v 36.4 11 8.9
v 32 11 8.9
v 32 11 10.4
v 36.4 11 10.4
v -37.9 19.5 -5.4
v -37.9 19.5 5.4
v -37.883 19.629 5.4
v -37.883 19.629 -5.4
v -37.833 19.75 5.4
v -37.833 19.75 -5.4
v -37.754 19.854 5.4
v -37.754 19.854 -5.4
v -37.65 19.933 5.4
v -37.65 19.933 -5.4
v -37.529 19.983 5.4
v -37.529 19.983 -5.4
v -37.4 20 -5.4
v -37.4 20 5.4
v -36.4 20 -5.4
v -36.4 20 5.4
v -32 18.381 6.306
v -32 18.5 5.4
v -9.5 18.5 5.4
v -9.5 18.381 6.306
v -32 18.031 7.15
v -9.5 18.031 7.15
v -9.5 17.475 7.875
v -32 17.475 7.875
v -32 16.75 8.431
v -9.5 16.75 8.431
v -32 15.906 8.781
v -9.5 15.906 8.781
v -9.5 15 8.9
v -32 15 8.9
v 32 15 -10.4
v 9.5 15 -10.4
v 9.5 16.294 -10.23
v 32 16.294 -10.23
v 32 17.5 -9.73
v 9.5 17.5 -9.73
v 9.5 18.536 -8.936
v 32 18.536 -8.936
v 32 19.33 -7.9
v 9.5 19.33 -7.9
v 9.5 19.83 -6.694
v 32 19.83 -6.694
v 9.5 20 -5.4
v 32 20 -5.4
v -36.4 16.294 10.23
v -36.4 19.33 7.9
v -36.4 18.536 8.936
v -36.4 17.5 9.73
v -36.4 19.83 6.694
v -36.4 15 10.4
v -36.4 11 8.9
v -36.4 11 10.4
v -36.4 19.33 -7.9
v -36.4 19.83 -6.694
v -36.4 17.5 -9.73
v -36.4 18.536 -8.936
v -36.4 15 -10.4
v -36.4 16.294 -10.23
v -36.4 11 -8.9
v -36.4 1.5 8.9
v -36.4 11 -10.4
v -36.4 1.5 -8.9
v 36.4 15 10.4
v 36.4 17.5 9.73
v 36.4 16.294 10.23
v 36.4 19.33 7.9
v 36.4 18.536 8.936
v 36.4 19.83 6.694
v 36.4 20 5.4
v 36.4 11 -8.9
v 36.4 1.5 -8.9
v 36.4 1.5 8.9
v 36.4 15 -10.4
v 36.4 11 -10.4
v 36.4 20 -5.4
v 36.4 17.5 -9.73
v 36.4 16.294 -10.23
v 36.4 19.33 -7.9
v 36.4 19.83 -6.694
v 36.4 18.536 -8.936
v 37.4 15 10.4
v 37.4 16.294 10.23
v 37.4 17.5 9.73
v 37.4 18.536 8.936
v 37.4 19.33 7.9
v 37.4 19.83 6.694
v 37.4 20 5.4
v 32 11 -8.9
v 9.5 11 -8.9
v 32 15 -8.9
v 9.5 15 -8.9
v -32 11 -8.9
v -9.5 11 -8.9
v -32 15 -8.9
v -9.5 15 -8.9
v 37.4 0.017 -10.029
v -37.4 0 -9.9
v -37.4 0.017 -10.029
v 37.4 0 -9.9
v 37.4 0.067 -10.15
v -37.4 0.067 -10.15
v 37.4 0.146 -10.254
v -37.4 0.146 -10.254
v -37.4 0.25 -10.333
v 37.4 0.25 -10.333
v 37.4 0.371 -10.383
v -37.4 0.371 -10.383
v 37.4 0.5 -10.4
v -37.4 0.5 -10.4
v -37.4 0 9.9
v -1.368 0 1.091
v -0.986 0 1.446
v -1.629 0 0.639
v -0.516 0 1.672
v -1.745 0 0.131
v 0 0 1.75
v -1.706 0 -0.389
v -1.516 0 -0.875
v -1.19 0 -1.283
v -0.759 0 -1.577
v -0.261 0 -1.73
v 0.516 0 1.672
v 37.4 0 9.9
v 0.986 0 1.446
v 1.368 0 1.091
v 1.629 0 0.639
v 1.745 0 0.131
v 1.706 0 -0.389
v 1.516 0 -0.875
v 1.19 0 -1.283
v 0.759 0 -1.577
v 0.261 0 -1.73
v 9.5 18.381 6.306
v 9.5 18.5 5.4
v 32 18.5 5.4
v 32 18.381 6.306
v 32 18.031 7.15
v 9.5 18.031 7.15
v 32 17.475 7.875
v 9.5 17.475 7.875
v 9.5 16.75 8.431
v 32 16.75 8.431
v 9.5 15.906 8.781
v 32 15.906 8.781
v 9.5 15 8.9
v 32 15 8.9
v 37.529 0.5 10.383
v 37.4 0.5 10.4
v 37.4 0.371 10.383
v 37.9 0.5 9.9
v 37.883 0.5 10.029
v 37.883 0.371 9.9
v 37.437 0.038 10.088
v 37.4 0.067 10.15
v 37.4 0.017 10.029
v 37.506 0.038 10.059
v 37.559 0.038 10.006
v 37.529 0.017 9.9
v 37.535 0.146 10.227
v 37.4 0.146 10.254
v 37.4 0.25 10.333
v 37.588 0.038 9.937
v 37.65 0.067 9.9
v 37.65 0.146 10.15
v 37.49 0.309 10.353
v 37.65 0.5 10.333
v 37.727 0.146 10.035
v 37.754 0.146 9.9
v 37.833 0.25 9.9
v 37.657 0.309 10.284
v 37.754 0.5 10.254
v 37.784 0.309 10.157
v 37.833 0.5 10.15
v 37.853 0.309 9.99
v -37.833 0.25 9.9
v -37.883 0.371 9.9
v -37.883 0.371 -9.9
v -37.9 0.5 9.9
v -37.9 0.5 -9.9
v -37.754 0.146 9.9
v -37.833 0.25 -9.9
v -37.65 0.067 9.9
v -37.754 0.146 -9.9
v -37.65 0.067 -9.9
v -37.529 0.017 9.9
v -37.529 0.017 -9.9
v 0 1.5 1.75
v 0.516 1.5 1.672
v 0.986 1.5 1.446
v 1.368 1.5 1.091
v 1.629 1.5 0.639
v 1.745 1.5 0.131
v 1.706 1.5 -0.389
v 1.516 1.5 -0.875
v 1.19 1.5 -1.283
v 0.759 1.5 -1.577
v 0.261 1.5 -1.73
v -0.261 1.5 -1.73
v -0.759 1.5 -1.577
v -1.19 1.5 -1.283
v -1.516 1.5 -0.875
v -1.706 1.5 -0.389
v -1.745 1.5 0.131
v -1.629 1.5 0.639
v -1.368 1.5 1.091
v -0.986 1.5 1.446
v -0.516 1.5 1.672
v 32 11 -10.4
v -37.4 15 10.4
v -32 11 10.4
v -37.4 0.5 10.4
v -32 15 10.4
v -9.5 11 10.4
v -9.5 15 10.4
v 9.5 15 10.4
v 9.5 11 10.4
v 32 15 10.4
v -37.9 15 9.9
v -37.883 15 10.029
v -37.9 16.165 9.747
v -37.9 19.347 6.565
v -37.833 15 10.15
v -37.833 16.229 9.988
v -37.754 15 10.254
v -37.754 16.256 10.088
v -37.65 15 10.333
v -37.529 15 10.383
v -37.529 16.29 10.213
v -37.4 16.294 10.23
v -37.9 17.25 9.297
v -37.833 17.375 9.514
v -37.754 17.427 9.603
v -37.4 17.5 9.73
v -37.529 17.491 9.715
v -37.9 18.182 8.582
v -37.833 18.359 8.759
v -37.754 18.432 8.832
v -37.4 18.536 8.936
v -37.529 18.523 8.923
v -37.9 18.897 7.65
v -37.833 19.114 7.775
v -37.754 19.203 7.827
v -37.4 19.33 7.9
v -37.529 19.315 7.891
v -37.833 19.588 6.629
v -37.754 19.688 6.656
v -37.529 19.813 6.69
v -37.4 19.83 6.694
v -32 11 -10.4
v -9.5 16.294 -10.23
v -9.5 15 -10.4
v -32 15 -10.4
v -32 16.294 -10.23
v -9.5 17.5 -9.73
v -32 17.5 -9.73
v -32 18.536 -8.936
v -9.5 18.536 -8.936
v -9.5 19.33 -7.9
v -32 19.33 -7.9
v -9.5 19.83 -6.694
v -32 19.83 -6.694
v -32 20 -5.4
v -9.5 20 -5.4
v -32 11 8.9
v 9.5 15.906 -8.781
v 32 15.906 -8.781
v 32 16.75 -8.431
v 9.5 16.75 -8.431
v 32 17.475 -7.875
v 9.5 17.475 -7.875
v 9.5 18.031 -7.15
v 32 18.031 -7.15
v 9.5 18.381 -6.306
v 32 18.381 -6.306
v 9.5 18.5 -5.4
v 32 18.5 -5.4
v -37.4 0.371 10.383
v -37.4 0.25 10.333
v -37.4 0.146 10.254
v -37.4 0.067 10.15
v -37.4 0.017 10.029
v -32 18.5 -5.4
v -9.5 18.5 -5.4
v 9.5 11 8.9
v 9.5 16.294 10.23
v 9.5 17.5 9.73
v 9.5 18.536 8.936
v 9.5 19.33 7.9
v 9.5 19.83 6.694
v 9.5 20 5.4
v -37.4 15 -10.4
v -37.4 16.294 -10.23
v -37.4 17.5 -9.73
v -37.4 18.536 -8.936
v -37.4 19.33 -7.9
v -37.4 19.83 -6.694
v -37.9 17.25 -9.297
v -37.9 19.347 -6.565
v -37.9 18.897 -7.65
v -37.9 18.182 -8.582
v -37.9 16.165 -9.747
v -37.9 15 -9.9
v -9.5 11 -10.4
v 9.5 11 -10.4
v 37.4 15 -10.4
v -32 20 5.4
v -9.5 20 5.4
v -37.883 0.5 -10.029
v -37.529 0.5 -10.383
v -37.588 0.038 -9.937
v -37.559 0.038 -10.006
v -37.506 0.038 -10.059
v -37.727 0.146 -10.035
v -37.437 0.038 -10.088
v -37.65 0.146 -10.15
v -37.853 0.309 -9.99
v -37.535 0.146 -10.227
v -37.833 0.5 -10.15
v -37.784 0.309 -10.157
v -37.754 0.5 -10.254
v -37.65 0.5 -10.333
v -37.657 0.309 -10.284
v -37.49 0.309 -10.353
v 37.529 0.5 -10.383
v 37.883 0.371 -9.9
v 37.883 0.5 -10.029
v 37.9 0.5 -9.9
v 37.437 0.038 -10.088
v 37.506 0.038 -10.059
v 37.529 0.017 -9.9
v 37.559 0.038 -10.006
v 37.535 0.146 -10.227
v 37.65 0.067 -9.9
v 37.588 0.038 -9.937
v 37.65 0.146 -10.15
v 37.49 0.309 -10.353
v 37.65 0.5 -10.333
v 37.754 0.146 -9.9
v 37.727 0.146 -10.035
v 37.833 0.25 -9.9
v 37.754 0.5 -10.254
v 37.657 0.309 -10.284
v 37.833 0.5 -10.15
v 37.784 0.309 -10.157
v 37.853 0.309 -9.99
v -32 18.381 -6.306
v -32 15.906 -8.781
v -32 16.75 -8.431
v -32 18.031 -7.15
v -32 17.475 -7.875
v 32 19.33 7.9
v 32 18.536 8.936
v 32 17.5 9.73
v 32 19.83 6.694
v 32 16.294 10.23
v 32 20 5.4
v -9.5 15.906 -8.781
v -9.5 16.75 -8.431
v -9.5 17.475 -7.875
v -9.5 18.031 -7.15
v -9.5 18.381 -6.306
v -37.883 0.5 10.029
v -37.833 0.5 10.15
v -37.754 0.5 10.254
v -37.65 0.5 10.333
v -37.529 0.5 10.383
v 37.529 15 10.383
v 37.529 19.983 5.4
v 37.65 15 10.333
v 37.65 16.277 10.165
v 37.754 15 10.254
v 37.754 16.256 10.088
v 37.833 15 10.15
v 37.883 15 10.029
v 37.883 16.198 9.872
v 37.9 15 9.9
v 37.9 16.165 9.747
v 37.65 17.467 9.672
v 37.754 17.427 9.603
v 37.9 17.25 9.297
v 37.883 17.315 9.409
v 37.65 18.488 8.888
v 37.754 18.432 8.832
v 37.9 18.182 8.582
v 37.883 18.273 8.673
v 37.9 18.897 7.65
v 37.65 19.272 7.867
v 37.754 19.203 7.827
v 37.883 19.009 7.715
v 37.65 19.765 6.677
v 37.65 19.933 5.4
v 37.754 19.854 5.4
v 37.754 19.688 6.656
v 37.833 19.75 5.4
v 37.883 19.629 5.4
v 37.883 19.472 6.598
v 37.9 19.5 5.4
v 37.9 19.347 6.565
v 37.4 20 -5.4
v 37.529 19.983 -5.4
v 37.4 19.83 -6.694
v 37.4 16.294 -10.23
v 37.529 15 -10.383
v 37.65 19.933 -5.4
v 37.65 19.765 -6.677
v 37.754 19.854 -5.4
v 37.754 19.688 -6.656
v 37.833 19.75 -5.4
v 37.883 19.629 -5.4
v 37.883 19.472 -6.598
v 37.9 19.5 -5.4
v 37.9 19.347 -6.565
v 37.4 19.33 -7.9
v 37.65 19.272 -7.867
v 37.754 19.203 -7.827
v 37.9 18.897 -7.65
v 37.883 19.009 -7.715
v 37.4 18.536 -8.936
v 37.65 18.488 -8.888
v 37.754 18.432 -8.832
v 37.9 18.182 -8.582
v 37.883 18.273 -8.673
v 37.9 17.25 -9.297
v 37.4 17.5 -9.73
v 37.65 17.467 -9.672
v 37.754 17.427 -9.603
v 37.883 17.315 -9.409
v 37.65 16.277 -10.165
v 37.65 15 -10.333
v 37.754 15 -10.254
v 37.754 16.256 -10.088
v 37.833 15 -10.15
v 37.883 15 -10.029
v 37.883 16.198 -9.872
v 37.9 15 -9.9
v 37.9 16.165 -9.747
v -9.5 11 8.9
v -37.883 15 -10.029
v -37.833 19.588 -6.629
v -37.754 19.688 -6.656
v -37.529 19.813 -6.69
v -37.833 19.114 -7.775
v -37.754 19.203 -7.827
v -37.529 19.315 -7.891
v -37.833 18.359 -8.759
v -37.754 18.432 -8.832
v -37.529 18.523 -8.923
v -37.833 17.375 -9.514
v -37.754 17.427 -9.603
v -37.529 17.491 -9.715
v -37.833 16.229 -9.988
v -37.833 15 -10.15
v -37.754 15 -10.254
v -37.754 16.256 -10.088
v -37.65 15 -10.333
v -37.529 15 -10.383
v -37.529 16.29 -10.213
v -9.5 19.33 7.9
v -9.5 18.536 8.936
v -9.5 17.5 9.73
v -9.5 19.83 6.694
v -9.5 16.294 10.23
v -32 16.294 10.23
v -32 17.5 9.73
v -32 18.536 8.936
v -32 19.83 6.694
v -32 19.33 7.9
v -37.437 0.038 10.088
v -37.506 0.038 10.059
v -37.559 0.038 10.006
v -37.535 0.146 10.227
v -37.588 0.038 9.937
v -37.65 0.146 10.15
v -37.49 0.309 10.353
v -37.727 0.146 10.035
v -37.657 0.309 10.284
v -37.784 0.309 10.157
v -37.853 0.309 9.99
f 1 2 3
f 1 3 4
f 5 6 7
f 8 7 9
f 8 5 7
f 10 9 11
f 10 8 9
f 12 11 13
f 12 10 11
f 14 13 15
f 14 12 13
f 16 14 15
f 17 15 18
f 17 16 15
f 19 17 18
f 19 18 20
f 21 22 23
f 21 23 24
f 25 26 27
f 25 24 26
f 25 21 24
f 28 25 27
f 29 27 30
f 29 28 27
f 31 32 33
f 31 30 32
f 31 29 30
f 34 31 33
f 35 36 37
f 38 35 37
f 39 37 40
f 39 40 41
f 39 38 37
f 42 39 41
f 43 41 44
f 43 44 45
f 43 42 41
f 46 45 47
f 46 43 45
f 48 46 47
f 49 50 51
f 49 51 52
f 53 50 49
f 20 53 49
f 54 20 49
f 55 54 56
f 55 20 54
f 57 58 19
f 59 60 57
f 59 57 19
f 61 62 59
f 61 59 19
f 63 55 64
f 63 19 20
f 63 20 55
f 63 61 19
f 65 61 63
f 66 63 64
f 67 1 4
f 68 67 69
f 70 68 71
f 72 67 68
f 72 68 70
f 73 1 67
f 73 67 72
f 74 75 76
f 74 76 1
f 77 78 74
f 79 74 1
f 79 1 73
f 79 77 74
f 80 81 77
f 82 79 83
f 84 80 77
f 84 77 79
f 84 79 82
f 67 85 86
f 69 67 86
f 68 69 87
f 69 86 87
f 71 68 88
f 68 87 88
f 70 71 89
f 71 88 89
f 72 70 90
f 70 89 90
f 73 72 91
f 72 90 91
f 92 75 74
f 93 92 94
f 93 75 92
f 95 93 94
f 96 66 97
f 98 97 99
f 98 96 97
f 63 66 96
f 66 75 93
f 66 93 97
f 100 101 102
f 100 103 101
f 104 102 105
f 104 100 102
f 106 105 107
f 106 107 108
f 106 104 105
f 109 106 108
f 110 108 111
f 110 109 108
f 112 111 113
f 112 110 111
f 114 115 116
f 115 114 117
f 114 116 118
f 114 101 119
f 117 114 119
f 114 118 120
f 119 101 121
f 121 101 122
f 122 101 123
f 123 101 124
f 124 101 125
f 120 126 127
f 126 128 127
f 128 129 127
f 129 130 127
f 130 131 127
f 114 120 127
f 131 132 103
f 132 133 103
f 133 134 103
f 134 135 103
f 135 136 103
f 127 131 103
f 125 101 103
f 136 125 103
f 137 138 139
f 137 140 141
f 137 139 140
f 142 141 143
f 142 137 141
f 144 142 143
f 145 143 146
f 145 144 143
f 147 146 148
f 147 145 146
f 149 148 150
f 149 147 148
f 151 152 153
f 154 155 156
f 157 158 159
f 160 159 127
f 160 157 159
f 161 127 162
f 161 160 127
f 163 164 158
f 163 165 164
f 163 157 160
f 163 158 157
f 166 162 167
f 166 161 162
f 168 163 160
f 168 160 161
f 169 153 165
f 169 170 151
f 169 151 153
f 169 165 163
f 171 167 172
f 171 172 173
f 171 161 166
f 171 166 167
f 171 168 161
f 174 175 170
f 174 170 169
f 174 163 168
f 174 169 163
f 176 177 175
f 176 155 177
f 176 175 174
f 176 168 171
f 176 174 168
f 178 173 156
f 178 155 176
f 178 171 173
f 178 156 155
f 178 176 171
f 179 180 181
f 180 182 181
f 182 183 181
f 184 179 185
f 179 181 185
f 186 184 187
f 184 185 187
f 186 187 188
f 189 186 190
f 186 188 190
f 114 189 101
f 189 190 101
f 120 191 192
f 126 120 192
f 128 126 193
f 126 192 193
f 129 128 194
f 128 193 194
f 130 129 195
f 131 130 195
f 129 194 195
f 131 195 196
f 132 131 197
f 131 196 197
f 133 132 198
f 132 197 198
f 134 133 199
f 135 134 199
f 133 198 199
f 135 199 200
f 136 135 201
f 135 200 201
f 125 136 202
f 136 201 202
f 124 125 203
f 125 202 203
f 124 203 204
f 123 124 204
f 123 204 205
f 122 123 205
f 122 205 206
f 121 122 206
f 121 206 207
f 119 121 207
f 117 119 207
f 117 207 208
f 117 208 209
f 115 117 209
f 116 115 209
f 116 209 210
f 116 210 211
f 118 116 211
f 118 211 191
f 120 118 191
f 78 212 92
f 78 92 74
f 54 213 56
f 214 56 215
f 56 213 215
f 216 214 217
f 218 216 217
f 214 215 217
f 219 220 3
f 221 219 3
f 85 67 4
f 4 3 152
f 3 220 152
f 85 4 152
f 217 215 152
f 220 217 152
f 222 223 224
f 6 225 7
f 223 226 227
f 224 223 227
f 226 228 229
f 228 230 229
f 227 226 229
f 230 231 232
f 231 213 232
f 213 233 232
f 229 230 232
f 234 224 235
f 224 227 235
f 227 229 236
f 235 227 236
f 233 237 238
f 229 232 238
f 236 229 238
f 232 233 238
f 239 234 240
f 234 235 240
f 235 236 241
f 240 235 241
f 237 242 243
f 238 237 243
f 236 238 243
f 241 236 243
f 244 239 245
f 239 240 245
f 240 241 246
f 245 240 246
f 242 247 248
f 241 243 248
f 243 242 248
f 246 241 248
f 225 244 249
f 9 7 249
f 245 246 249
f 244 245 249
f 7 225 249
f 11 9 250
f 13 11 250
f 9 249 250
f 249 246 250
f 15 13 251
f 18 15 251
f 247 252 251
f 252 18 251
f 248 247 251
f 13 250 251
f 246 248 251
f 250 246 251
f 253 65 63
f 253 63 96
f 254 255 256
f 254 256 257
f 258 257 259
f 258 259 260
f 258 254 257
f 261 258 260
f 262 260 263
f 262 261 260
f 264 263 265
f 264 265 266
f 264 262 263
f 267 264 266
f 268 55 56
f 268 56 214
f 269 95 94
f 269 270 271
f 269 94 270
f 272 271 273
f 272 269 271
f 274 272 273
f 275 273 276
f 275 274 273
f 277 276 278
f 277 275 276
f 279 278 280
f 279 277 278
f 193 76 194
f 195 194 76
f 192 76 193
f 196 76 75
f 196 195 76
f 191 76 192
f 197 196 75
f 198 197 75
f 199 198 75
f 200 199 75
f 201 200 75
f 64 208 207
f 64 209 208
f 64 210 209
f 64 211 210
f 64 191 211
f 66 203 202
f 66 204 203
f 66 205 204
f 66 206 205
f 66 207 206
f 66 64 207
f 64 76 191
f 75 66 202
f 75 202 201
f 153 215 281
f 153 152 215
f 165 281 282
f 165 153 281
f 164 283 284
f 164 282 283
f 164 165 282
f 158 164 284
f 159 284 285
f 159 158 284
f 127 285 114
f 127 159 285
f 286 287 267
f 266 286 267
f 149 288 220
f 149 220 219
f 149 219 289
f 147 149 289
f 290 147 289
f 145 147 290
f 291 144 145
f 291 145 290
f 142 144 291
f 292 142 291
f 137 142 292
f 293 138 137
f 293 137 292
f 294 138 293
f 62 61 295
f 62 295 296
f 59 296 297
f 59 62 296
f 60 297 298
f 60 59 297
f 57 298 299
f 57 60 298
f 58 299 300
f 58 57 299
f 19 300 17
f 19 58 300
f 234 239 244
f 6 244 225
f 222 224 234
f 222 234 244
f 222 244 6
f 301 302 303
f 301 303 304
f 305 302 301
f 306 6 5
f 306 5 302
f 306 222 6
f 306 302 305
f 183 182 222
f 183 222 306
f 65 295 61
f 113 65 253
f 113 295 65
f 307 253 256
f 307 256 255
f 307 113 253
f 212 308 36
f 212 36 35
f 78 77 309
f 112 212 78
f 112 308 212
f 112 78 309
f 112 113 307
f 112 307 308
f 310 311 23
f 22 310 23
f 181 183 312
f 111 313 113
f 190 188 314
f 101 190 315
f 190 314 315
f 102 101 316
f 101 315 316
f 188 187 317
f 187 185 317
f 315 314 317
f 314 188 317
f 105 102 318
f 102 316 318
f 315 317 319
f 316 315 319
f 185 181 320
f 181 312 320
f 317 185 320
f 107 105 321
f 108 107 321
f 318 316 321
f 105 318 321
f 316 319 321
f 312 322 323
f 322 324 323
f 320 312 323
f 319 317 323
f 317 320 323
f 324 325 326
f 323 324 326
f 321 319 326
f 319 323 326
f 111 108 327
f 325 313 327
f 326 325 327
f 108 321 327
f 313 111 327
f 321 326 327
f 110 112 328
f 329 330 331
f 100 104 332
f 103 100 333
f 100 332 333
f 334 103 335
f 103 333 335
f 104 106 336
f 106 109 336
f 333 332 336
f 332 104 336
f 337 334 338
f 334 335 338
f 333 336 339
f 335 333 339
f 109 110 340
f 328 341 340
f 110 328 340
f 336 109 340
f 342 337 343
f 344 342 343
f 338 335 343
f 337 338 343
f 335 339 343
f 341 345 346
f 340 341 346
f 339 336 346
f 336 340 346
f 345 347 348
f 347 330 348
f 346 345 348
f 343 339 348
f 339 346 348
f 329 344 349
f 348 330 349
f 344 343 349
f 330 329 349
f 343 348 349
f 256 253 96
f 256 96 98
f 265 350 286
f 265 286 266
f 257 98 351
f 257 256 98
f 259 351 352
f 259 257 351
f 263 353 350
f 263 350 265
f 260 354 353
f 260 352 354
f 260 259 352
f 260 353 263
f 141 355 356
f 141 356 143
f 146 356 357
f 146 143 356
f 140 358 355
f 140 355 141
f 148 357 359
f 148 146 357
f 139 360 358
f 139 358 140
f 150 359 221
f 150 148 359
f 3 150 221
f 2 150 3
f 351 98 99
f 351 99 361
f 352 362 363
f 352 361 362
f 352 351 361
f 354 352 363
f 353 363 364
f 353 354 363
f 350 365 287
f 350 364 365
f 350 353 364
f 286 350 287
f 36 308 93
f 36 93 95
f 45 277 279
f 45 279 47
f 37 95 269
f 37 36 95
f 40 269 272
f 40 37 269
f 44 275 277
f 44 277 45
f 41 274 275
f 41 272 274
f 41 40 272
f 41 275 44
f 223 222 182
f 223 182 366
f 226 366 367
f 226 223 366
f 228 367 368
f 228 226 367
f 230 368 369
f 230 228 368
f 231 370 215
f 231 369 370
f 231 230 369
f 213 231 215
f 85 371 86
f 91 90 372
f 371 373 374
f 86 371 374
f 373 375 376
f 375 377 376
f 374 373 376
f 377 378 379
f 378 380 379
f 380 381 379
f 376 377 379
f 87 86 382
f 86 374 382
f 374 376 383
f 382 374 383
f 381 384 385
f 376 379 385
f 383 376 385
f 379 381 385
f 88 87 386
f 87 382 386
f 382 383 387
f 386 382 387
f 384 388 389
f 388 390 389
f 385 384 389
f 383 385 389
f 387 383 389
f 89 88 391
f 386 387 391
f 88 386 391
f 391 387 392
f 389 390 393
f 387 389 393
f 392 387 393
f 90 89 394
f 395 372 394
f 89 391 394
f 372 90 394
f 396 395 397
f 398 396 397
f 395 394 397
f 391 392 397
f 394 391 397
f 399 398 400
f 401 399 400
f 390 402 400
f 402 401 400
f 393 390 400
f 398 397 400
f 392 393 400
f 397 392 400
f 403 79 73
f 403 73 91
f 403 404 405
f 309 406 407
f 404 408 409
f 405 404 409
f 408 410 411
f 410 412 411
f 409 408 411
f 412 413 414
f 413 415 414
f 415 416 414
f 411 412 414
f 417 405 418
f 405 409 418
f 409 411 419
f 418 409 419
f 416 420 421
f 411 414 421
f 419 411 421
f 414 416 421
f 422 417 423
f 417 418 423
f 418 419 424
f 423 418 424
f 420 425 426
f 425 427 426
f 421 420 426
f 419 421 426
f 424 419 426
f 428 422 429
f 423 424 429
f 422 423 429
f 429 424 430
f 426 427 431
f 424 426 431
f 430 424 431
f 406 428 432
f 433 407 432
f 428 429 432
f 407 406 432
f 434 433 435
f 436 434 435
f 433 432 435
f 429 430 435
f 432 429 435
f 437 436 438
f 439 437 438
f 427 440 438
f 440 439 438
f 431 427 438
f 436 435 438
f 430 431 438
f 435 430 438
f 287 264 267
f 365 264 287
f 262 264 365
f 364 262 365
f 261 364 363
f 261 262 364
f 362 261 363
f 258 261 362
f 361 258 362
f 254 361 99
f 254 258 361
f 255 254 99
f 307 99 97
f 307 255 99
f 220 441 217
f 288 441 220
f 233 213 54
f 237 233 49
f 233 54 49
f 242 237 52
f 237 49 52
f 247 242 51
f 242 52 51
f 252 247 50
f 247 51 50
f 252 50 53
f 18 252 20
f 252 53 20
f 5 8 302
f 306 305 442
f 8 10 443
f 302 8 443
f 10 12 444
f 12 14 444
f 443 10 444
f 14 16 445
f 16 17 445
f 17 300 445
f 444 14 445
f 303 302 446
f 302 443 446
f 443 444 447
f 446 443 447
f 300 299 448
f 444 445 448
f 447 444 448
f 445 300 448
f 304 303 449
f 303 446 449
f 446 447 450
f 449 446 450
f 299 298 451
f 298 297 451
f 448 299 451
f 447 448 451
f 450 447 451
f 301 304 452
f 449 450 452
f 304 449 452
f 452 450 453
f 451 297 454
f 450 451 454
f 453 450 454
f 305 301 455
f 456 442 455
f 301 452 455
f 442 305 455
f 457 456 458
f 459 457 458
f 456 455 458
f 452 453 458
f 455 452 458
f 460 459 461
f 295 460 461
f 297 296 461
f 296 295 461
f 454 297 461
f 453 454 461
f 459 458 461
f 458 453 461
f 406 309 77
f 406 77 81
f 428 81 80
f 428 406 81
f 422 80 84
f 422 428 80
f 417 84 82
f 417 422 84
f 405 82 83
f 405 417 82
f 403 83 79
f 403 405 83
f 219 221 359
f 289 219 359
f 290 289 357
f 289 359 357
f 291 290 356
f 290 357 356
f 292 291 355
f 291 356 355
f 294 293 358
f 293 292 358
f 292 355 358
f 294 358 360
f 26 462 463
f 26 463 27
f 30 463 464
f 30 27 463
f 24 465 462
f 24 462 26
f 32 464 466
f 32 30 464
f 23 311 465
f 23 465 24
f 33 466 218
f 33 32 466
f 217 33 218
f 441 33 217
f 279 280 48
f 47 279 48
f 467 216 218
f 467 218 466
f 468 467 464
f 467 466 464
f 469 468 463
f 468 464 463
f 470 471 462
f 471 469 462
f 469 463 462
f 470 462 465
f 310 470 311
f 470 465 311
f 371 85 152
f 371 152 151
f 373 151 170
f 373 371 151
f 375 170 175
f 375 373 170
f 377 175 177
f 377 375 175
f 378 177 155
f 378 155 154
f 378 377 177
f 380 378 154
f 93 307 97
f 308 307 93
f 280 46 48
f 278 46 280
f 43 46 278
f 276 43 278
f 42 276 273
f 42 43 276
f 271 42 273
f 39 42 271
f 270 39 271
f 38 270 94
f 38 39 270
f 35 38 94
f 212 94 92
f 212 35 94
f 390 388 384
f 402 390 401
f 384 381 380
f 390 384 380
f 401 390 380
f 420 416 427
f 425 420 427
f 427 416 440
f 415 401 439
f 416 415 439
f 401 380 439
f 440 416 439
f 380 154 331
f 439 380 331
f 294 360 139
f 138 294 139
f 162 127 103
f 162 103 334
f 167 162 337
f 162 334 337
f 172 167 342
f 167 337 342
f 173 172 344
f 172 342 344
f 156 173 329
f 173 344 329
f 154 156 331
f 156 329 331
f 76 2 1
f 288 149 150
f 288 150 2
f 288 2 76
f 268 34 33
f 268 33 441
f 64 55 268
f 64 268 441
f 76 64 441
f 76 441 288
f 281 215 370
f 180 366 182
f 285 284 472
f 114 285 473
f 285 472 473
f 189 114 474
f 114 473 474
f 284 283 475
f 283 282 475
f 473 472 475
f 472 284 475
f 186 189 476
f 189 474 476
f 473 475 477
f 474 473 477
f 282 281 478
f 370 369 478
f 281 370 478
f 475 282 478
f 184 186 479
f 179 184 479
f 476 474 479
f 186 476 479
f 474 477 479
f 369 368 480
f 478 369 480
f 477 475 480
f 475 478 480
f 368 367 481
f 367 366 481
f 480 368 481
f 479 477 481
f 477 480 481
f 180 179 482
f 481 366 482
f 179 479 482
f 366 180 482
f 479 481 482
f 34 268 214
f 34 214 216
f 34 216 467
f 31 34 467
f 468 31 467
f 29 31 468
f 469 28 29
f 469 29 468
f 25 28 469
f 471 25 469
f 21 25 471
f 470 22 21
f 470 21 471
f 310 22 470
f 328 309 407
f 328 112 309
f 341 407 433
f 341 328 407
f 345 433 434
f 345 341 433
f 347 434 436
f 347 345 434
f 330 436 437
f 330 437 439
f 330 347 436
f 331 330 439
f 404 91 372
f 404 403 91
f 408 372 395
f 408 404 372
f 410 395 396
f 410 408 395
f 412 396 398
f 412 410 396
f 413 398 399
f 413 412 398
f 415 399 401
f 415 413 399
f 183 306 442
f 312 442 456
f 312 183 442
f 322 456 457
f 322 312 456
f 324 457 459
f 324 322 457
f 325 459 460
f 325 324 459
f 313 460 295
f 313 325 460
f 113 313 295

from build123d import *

# Parameters (mm, degrees)
CROQUIS1_W                        = 75.8
CROQUIS1_H                        = 20.8
SALIENTE_EXTRUIR1_DEPTH           = 20
REDONDEO1_R                       = 5
REDONDEO2_R                       = 0.5
VACIADO1_START                    = -36.4
VACIADO1_DEPTH                    = 72.8
CORTAR_EXTRUIR1_DEPTH             = 45.097278828
CORTAR_EXTRUIR1_DEPTH_BACK        = 45.097278828
CORTAR_EXTRUIR2_REACH             = 45.438
CROQUIS3_R                        = 1.75
CORTAR_EXTRUIR2_DIRECTION_2_DEPTH = 44.437541367


# Read off the part's stored shape, not the designer's step: Vaciado1
with BuildPart() as part:
    # Croquis1 → Saliente-Extruir1 (new body)
    with BuildSketch(Plane(origin=(0, 0, 0), x_dir=(1, 0, 0), z_dir=(0, 1, 0))):
        Rectangle(CROQUIS1_W, CROQUIS1_H)
    extrude(amount=SALIENTE_EXTRUIR1_DEPTH)

    # Redondeo1
    redondeo1_edges = [part.edges().sort_by_distance(p)[0] for p in [
        (0, 20, 10.4),
        (0, 20, -10.4),
    ]]
    fillet(redondeo1_edges, radius=REDONDEO1_R)

    # Redondeo2
    redondeo2_edges = [part.edges().sort_by_distance(p)[0] for p in [
        (37.9, 20, 0),
        (-37.9, 20, 0),
        (-37.9, 7.5, 10.4),
        (-37.9, 7.5, -10.4),
        (-37.9, 18.535533906, 8.935533906),
        (-37.9, 18.535533906, -8.935533906),
        (37.9, 7.5, -10.4),
        (37.9, 7.5, 10.4),
        (37.9, 18.535533906, 8.935533906),
        (37.9, 18.535533906, -8.935533906),
        (0, 0, 10.4),
        (-37.9, 0, 0),
        (0, 0, -10.4),
        (37.9, 0, 0),
    ]]
    fillet(redondeo2_edges, radius=REDONDEO2_R)

    # Vaciado1 outline → Vaciado1 (cut)
    with BuildSketch(Plane.YZ.offset(VACIADO1_START)):
        with BuildLine():
            Line((20, -5.4), (20, 5.4))
            Line((20, 5.4), (18.5, 5.4))
            ThreePointArc((18.5, 5.4), (17.474873734, 7.874873734), (15, 8.9))
            Line((15, 8.9), (1.5, 8.9))
            Line((1.5, 8.9), (1.5, -8.9))
            Line((1.5, -8.9), (15, -8.9))
            ThreePointArc((15, -8.9), (17.474873734, -7.874873734), (18.5, -5.4))
            Line((18.5, -5.4), (20, -5.4))
        make_face()
    extrude(amount=VACIADO1_DEPTH, mode=Mode.SUBTRACT)

    # Croquis2 → Cortar-Extruir1 (cut, two sides: drawn at the far end of the back side and taken through both)
    with BuildSketch(Plane.XY.offset(-CORTAR_EXTRUIR1_DEPTH_BACK)):
        Polygon((-9.5, 11), (9.5, 11), (9.5, 20), (32, 20), (32, 11), (36.4, 11), (36.4, 23), (-36.4, 23), (-36.4, 11), (-32, 11), (-32, 20), (-9.5, 20), align=None)
    extrude(amount=CORTAR_EXTRUIR1_DEPTH + CORTAR_EXTRUIR1_DEPTH_BACK, mode=Mode.SUBTRACT)

    # Croquis3 → Cortar-Extruir2 (cut, up to next)
    with BuildSketch(Plane(origin=(0, 1.5, 0), x_dir=(1, 0, 0), z_dir=(0, 1, 0)), mode=Mode.PRIVATE) as cortar_extruir2_sk1:
        with Locations(Location((0, 0, 0), (0, 0, 270))):
            Circle(CROQUIS3_R)
    cortar_extruir2_tool1 = extrude(cortar_extruir2_sk1.sketch, amount=-CORTAR_EXTRUIR2_REACH, mode=Mode.PRIVATE) & part.part
    add(cortar_extruir2_tool1.solids().sort_by_distance((0, 1.5, 0))[0], mode=Mode.SUBTRACT)

    # Croquis3 → Cortar-Extruir2 direction 2 (cut)
    with BuildSketch(Plane(origin=(0, 1.5, 0), x_dir=(1, 0, 0), z_dir=(0, 1, 0))):
        with Locations(Location((0, 0, 0), (0, 0, 270))):
            Circle(CROQUIS3_R)
    extrude(amount=CORTAR_EXTRUIR2_DIRECTION_2_DEPTH, mode=Mode.SUBTRACT)


solid = part.part
